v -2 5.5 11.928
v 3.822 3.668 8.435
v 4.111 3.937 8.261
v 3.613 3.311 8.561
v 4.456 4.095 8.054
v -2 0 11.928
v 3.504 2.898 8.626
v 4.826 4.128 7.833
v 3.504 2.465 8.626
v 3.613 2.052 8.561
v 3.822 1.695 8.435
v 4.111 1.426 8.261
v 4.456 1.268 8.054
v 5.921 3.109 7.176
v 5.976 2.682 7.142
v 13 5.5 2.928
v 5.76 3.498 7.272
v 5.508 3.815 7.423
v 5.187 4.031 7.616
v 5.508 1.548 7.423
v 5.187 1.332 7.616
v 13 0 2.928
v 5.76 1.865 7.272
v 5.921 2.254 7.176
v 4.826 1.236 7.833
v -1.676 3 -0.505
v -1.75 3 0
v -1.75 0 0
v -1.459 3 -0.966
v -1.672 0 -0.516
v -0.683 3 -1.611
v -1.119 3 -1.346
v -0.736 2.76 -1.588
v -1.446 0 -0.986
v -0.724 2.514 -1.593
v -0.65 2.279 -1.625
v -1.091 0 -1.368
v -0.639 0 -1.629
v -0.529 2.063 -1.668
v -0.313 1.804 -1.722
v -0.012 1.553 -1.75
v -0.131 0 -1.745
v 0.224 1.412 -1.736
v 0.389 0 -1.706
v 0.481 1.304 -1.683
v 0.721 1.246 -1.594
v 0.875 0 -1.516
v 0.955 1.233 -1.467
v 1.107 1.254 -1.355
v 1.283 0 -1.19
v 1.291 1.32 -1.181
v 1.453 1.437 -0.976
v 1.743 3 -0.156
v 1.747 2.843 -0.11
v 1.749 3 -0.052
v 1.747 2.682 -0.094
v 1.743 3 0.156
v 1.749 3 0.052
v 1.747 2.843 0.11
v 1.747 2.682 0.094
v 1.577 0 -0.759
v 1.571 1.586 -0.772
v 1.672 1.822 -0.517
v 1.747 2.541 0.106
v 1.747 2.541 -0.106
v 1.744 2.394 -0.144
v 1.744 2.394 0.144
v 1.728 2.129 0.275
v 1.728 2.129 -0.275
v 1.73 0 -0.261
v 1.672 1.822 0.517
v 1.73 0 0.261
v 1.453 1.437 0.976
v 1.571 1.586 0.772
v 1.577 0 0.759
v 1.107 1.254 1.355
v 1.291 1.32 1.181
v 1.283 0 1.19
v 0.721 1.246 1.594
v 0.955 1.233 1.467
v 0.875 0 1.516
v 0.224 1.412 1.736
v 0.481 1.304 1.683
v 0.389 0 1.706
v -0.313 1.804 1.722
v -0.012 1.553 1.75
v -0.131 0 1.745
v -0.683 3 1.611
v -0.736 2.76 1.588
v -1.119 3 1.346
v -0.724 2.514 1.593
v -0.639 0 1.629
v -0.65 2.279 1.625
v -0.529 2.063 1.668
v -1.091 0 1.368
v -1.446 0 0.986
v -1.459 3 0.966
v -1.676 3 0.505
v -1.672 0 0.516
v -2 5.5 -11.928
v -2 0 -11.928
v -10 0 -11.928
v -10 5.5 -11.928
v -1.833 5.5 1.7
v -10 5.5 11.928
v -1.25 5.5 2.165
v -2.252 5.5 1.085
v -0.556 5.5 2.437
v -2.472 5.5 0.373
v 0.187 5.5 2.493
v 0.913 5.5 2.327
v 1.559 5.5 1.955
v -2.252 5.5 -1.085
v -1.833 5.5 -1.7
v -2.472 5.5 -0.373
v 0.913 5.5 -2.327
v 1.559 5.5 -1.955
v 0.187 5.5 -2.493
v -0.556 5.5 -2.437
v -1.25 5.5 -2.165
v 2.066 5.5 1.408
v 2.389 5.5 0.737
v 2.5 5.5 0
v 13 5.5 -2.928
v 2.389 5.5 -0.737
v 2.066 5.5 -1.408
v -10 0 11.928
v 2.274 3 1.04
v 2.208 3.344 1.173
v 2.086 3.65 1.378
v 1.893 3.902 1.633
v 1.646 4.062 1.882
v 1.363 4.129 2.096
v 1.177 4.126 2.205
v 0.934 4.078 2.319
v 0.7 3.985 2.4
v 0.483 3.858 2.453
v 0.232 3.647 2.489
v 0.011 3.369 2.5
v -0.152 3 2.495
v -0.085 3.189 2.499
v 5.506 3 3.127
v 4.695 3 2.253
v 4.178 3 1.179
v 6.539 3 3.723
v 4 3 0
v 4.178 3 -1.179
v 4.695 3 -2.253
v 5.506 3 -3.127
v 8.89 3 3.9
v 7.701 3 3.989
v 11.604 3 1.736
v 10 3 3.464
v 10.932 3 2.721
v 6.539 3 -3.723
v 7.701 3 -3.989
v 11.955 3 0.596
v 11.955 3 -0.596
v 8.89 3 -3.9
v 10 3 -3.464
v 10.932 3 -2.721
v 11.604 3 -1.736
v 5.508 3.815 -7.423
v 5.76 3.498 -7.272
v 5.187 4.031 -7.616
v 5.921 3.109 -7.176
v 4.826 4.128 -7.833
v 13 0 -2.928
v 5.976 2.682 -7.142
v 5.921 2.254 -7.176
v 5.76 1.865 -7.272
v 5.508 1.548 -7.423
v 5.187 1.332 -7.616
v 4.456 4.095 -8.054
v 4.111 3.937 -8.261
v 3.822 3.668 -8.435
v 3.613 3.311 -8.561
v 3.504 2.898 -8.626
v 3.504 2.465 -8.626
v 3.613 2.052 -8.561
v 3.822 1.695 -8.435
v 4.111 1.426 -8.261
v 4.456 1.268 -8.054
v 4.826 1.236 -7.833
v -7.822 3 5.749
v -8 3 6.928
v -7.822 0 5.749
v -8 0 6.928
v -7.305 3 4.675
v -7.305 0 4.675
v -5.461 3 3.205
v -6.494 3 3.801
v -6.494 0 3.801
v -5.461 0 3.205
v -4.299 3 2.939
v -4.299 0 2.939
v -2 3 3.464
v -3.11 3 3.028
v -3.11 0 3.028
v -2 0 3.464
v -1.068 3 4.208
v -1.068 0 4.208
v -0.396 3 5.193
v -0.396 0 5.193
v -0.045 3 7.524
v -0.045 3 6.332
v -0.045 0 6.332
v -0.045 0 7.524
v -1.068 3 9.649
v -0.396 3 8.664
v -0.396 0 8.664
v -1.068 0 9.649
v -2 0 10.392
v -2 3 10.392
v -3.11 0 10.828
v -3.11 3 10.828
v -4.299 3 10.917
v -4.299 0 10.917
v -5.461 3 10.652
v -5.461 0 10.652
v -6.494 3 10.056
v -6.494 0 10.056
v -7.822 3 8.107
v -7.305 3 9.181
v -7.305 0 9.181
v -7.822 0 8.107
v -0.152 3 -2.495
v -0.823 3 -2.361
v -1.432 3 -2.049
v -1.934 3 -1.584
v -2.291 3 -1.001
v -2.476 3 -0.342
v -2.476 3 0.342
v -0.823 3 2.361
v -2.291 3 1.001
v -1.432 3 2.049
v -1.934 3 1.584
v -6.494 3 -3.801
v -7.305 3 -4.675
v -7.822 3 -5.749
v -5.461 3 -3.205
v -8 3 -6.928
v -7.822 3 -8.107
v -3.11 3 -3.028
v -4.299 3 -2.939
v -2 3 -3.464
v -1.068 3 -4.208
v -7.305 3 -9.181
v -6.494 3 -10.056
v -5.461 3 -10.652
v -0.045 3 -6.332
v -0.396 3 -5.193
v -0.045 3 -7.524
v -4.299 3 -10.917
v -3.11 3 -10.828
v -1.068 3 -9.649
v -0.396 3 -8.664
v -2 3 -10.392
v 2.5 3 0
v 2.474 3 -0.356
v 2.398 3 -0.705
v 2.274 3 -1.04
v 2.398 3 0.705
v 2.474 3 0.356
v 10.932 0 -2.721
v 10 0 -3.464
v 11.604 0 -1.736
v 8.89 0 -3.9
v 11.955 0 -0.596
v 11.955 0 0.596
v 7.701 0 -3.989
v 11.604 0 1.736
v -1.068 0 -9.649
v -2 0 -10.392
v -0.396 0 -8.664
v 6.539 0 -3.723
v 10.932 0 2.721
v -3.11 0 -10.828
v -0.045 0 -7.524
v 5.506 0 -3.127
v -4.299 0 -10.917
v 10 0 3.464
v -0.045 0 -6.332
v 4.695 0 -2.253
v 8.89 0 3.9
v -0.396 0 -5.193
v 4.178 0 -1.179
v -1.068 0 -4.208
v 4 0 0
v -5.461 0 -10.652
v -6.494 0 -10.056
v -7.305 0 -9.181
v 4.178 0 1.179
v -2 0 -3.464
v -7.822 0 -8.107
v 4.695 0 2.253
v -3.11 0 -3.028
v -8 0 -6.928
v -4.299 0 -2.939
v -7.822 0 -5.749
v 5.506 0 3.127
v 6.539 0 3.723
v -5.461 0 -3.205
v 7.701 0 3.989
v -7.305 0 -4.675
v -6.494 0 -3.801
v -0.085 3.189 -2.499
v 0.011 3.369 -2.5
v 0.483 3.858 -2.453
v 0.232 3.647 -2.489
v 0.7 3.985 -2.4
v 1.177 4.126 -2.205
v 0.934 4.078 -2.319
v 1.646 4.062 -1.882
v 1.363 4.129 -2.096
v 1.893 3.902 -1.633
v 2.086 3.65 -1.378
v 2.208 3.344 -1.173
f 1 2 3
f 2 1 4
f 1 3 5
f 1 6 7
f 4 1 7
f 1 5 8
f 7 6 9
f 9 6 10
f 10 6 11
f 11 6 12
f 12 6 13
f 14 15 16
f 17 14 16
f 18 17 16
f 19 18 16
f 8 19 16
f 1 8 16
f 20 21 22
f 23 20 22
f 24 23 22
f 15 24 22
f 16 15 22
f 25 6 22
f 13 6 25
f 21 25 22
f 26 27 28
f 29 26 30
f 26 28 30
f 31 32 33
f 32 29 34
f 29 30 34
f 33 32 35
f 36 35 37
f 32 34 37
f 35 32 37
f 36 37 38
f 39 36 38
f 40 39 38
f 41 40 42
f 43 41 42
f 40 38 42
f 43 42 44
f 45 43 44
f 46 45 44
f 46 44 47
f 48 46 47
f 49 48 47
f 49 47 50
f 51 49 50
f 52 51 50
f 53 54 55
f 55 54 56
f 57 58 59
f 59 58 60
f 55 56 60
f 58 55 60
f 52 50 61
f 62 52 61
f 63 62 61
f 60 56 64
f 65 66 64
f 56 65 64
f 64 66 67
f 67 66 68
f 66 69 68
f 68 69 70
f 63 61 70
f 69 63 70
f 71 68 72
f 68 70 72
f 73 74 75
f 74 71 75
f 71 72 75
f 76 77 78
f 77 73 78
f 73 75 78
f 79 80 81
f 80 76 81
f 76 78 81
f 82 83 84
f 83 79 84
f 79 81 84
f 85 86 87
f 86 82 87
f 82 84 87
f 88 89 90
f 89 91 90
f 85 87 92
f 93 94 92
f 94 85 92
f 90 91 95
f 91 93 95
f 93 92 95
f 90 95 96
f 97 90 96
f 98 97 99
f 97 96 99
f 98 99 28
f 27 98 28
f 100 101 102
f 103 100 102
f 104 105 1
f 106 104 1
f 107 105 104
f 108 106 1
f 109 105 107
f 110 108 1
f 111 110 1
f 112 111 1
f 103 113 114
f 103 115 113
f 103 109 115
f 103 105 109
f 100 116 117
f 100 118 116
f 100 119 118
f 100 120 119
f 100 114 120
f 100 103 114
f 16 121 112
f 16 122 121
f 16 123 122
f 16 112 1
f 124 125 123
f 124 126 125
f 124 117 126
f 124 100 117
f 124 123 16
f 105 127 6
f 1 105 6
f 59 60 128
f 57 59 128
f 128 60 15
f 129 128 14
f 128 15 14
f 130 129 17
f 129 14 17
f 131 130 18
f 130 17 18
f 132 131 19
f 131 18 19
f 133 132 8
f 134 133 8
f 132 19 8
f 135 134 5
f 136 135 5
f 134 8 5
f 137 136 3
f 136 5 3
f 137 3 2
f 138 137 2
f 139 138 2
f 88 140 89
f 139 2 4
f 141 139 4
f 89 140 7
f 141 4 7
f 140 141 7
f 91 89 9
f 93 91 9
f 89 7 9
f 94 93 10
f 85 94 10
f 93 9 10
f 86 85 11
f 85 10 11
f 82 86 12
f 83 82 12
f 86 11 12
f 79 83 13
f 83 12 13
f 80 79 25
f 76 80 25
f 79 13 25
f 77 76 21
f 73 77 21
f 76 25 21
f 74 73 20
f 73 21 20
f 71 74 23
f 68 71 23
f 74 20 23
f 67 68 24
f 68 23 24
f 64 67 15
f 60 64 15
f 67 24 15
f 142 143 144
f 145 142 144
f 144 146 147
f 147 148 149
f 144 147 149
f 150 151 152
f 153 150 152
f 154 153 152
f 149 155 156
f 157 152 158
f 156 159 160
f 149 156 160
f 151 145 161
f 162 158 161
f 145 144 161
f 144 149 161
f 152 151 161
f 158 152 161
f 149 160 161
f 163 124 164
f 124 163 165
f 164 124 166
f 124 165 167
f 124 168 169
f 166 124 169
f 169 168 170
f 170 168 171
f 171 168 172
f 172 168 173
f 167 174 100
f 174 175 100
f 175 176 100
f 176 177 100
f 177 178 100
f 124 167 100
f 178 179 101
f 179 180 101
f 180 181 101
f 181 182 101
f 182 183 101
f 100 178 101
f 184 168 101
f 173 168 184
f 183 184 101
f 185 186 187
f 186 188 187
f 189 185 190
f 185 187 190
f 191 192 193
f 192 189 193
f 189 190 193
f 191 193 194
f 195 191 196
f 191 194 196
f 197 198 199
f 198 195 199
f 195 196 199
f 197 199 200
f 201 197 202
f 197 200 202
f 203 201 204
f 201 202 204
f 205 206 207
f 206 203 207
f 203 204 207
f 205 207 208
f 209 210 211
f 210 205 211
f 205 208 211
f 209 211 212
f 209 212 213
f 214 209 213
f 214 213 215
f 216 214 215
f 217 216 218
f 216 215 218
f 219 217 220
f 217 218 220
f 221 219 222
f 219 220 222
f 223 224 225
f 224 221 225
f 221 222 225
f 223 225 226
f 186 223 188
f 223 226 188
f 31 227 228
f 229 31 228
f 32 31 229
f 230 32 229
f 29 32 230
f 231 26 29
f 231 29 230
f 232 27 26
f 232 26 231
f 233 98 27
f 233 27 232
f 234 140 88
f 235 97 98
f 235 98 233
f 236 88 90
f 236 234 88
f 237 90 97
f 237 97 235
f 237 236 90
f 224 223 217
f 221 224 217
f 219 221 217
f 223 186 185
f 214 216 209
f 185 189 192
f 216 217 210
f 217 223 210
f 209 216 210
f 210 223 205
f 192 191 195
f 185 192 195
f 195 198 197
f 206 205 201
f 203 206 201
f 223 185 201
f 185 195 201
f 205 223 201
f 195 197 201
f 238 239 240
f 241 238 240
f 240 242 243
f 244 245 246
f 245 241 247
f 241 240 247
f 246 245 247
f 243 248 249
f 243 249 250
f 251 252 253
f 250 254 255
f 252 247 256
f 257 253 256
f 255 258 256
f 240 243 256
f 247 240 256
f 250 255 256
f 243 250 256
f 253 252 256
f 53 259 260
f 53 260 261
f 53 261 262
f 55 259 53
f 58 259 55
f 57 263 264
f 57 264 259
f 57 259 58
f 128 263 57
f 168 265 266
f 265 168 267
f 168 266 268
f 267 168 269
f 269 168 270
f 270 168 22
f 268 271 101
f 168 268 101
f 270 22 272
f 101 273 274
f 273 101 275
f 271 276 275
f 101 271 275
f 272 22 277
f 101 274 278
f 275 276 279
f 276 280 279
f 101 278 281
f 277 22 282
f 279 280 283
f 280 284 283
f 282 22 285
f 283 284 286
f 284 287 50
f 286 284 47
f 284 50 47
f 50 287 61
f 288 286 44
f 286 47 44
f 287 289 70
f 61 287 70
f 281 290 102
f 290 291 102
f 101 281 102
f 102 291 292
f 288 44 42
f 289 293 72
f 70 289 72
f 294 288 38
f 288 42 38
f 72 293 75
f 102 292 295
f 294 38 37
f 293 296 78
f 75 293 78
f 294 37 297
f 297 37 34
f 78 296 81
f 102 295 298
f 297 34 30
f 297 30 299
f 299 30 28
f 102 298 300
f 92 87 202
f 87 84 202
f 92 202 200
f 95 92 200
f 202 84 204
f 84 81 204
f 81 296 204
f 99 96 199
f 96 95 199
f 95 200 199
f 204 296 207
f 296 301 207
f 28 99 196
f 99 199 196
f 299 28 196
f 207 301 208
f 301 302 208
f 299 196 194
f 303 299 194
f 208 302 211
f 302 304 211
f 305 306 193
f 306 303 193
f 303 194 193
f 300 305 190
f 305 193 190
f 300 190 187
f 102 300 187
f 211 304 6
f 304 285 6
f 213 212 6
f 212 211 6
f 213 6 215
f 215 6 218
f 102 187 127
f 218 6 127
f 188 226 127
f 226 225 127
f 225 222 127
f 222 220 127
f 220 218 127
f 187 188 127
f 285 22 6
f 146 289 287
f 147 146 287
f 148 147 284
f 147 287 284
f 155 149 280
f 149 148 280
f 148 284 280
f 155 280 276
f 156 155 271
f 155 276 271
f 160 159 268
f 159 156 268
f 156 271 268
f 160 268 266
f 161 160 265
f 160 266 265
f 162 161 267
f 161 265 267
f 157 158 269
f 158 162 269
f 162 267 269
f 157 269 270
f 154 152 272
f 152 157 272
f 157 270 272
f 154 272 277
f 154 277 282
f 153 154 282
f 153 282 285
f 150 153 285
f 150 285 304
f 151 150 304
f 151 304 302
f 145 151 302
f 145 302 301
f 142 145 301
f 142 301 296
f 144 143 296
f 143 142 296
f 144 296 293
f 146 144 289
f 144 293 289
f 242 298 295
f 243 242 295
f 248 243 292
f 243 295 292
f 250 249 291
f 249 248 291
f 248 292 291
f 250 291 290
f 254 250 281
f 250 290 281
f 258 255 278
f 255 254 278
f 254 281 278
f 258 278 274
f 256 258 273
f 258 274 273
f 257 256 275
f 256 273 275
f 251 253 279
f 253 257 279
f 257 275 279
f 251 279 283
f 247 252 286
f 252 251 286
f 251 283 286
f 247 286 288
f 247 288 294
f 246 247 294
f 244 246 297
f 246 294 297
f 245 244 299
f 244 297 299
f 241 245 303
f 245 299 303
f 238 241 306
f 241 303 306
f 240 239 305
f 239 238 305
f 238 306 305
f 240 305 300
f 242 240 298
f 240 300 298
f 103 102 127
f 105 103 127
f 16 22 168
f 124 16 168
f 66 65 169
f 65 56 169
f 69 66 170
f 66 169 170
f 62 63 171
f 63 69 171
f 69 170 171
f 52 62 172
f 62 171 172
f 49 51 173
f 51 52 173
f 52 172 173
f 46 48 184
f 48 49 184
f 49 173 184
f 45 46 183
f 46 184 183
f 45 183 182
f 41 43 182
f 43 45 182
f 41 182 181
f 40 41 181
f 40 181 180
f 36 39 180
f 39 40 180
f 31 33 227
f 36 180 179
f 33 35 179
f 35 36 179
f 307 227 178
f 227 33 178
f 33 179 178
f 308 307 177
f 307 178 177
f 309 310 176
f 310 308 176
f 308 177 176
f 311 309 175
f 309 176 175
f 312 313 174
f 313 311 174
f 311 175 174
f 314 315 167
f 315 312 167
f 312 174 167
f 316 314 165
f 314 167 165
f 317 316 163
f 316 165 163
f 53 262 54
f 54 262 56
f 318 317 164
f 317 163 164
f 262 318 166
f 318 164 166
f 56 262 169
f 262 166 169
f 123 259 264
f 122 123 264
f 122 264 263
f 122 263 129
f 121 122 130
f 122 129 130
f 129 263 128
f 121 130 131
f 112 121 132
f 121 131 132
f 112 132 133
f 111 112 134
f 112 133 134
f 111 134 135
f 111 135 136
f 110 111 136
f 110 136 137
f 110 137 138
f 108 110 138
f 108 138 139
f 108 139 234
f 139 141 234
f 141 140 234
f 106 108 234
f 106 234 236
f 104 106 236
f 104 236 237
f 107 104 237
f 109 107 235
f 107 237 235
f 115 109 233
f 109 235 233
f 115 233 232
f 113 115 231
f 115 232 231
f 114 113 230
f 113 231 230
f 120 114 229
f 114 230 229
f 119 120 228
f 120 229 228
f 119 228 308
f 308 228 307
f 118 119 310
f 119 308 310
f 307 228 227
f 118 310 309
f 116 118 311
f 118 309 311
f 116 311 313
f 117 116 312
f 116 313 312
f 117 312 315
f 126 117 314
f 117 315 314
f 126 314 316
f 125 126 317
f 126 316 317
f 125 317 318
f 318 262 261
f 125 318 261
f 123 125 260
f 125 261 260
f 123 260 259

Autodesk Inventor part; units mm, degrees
ref_plane "YZ Plane" through (0, 0, 0) normal (1, 0, 0) x (0, 1, 0)
ref_plane "XZ Plane" through (0, 0, 0) normal (0, 1, 0) x (-1, 0, 0)
ref_plane "XY Plane" through (0, 0, 0) normal (0, 0, 1) x (1, 0, 0)
sketch "Sketch1" plane through (0, 0, 0) normal (0, 1, 0) x (-1, 0, 0)
  line L0 (-13, -11.9282) -> (10, -11.9282)
  line L1 (10, -11.9282) -> (10, 11.9282)
  line L2 (10, 11.9282) -> (-13, 11.9282)
  line L3 (-13, 11.9282) -> (-13, -11.9282)
  circle A0 centre (-8, 0) radius 4
  circle A1 centre (4, -6.9282) radius 4
  circle A2 centre (4, 6.9282) radius 4
  circle A3 centre (0, 0) radius 8 construction
  circle A4 centre (0, 0) radius 1.75
  dimension "d11" = 16
  dimension "d2" = 8
  dimension "d6" = 360
  dimension "d8" = 6
  dimension "d9" = 5
  dimension "d12" = 5
  dimension "d13" = 5
  dimension "d35" = 3.5
extrude "Extrusion1" add sketch "Sketch1" along normal blind 3
sketch "Sketch2" plane through (0, 3, 0) normal (0, 1, 0) x (1, 0, 0)
  circle A0 centre (-4, -6.9282) radius 4 projected
  circle A1 centre (-4, 6.9282) radius 4 projected
  circle A2 centre (8, 0) radius 4 projected
  line L0 (13, 11.9282) -> (-10, 11.9282) projected
  line L1 (-10, 11.9282) -> (-10, -11.9282) projected
  line L2 (-10, -11.9282) -> (13, -11.9282) projected
  line L3 (13, -11.9282) -> (13, 11.9282) projected
  circle A3 centre (0, 0) radius 2.5
  dimension "d16" = 5
extrude "Extrusion2" add sketch "Sketch2" along normal blind 2.5 contours A0 | A1 | A2 | L3 L2 L1 L0
sketch "Sketch3" plane through (0, 0, 0) normal (0, -1, 0) x (1, 0, 0)
  circle A0 centre (-4, 6.9282) radius 4 projected
  circle A1 centre (-4, -6.9282) radius 4 projected
  circle A2 centre (8, 0) radius 4 projected
  line L0 (13, -11.9282) -> (-10, -11.9282) projected
  line L1 (13, 11.9282) -> (13, -11.9282) projected
  line L2 (-10, 11.9282) -> (13, 11.9282) projected
  line L3 (-10, -11.9282) -> (-10, 11.9282) construction
  line L4 (-2, 11.9282) -> (13, 2.9282)
  line L5 (13, 11.9282) -> (13, -11.9282) projected
  line L6 (13, -2.9282) -> (-2, -11.9282)
  point P0 (0, 0)
  dimension "d19" = 9
  dimension "d20" = 9
  dimension "d21" = 15
  dimension "d22" = 15
extrude "Extrusion3" cut sketch "Sketch3" against normal through all contours L4 L2 L1 | L0 L6 L1
sketch "Skizze10" plane through (-2, 0, 11.9282) normal (0.5145, 0, 0.8575) x (0.8575, 0, -0.5145)
  line L0 (9.602, 0) -> (6.102, 0) projected
  line L1 (9.602, 0) -> (9.602, 3) projected
  line L2 (6.102, 0) -> (6.102, 3) projected
  circle A0 centre (7.852, 2.6816) radius 1.45
  point P0 (7.852, 0)
  dimension "d42" = 2.9
extrude "Extrusion9" cut sketch "Skizze10" against normal up to surface
ref_plane "Arbeitsebene1" through (-10, 0, 0) normal (0, 0, 1) x (1, 0, 0)
mirror "Spiegeln1" about plane through (-10, 0, 0) normal (0, 0, 1) of "Extrusion9"
equation "\"d12\" = d9"
equation "\"d13\" = d9"
equation "\"d43\" = d42"
properties part number "30_Cube_Z_Focus_Drylin_NEMA_slide_part1"
